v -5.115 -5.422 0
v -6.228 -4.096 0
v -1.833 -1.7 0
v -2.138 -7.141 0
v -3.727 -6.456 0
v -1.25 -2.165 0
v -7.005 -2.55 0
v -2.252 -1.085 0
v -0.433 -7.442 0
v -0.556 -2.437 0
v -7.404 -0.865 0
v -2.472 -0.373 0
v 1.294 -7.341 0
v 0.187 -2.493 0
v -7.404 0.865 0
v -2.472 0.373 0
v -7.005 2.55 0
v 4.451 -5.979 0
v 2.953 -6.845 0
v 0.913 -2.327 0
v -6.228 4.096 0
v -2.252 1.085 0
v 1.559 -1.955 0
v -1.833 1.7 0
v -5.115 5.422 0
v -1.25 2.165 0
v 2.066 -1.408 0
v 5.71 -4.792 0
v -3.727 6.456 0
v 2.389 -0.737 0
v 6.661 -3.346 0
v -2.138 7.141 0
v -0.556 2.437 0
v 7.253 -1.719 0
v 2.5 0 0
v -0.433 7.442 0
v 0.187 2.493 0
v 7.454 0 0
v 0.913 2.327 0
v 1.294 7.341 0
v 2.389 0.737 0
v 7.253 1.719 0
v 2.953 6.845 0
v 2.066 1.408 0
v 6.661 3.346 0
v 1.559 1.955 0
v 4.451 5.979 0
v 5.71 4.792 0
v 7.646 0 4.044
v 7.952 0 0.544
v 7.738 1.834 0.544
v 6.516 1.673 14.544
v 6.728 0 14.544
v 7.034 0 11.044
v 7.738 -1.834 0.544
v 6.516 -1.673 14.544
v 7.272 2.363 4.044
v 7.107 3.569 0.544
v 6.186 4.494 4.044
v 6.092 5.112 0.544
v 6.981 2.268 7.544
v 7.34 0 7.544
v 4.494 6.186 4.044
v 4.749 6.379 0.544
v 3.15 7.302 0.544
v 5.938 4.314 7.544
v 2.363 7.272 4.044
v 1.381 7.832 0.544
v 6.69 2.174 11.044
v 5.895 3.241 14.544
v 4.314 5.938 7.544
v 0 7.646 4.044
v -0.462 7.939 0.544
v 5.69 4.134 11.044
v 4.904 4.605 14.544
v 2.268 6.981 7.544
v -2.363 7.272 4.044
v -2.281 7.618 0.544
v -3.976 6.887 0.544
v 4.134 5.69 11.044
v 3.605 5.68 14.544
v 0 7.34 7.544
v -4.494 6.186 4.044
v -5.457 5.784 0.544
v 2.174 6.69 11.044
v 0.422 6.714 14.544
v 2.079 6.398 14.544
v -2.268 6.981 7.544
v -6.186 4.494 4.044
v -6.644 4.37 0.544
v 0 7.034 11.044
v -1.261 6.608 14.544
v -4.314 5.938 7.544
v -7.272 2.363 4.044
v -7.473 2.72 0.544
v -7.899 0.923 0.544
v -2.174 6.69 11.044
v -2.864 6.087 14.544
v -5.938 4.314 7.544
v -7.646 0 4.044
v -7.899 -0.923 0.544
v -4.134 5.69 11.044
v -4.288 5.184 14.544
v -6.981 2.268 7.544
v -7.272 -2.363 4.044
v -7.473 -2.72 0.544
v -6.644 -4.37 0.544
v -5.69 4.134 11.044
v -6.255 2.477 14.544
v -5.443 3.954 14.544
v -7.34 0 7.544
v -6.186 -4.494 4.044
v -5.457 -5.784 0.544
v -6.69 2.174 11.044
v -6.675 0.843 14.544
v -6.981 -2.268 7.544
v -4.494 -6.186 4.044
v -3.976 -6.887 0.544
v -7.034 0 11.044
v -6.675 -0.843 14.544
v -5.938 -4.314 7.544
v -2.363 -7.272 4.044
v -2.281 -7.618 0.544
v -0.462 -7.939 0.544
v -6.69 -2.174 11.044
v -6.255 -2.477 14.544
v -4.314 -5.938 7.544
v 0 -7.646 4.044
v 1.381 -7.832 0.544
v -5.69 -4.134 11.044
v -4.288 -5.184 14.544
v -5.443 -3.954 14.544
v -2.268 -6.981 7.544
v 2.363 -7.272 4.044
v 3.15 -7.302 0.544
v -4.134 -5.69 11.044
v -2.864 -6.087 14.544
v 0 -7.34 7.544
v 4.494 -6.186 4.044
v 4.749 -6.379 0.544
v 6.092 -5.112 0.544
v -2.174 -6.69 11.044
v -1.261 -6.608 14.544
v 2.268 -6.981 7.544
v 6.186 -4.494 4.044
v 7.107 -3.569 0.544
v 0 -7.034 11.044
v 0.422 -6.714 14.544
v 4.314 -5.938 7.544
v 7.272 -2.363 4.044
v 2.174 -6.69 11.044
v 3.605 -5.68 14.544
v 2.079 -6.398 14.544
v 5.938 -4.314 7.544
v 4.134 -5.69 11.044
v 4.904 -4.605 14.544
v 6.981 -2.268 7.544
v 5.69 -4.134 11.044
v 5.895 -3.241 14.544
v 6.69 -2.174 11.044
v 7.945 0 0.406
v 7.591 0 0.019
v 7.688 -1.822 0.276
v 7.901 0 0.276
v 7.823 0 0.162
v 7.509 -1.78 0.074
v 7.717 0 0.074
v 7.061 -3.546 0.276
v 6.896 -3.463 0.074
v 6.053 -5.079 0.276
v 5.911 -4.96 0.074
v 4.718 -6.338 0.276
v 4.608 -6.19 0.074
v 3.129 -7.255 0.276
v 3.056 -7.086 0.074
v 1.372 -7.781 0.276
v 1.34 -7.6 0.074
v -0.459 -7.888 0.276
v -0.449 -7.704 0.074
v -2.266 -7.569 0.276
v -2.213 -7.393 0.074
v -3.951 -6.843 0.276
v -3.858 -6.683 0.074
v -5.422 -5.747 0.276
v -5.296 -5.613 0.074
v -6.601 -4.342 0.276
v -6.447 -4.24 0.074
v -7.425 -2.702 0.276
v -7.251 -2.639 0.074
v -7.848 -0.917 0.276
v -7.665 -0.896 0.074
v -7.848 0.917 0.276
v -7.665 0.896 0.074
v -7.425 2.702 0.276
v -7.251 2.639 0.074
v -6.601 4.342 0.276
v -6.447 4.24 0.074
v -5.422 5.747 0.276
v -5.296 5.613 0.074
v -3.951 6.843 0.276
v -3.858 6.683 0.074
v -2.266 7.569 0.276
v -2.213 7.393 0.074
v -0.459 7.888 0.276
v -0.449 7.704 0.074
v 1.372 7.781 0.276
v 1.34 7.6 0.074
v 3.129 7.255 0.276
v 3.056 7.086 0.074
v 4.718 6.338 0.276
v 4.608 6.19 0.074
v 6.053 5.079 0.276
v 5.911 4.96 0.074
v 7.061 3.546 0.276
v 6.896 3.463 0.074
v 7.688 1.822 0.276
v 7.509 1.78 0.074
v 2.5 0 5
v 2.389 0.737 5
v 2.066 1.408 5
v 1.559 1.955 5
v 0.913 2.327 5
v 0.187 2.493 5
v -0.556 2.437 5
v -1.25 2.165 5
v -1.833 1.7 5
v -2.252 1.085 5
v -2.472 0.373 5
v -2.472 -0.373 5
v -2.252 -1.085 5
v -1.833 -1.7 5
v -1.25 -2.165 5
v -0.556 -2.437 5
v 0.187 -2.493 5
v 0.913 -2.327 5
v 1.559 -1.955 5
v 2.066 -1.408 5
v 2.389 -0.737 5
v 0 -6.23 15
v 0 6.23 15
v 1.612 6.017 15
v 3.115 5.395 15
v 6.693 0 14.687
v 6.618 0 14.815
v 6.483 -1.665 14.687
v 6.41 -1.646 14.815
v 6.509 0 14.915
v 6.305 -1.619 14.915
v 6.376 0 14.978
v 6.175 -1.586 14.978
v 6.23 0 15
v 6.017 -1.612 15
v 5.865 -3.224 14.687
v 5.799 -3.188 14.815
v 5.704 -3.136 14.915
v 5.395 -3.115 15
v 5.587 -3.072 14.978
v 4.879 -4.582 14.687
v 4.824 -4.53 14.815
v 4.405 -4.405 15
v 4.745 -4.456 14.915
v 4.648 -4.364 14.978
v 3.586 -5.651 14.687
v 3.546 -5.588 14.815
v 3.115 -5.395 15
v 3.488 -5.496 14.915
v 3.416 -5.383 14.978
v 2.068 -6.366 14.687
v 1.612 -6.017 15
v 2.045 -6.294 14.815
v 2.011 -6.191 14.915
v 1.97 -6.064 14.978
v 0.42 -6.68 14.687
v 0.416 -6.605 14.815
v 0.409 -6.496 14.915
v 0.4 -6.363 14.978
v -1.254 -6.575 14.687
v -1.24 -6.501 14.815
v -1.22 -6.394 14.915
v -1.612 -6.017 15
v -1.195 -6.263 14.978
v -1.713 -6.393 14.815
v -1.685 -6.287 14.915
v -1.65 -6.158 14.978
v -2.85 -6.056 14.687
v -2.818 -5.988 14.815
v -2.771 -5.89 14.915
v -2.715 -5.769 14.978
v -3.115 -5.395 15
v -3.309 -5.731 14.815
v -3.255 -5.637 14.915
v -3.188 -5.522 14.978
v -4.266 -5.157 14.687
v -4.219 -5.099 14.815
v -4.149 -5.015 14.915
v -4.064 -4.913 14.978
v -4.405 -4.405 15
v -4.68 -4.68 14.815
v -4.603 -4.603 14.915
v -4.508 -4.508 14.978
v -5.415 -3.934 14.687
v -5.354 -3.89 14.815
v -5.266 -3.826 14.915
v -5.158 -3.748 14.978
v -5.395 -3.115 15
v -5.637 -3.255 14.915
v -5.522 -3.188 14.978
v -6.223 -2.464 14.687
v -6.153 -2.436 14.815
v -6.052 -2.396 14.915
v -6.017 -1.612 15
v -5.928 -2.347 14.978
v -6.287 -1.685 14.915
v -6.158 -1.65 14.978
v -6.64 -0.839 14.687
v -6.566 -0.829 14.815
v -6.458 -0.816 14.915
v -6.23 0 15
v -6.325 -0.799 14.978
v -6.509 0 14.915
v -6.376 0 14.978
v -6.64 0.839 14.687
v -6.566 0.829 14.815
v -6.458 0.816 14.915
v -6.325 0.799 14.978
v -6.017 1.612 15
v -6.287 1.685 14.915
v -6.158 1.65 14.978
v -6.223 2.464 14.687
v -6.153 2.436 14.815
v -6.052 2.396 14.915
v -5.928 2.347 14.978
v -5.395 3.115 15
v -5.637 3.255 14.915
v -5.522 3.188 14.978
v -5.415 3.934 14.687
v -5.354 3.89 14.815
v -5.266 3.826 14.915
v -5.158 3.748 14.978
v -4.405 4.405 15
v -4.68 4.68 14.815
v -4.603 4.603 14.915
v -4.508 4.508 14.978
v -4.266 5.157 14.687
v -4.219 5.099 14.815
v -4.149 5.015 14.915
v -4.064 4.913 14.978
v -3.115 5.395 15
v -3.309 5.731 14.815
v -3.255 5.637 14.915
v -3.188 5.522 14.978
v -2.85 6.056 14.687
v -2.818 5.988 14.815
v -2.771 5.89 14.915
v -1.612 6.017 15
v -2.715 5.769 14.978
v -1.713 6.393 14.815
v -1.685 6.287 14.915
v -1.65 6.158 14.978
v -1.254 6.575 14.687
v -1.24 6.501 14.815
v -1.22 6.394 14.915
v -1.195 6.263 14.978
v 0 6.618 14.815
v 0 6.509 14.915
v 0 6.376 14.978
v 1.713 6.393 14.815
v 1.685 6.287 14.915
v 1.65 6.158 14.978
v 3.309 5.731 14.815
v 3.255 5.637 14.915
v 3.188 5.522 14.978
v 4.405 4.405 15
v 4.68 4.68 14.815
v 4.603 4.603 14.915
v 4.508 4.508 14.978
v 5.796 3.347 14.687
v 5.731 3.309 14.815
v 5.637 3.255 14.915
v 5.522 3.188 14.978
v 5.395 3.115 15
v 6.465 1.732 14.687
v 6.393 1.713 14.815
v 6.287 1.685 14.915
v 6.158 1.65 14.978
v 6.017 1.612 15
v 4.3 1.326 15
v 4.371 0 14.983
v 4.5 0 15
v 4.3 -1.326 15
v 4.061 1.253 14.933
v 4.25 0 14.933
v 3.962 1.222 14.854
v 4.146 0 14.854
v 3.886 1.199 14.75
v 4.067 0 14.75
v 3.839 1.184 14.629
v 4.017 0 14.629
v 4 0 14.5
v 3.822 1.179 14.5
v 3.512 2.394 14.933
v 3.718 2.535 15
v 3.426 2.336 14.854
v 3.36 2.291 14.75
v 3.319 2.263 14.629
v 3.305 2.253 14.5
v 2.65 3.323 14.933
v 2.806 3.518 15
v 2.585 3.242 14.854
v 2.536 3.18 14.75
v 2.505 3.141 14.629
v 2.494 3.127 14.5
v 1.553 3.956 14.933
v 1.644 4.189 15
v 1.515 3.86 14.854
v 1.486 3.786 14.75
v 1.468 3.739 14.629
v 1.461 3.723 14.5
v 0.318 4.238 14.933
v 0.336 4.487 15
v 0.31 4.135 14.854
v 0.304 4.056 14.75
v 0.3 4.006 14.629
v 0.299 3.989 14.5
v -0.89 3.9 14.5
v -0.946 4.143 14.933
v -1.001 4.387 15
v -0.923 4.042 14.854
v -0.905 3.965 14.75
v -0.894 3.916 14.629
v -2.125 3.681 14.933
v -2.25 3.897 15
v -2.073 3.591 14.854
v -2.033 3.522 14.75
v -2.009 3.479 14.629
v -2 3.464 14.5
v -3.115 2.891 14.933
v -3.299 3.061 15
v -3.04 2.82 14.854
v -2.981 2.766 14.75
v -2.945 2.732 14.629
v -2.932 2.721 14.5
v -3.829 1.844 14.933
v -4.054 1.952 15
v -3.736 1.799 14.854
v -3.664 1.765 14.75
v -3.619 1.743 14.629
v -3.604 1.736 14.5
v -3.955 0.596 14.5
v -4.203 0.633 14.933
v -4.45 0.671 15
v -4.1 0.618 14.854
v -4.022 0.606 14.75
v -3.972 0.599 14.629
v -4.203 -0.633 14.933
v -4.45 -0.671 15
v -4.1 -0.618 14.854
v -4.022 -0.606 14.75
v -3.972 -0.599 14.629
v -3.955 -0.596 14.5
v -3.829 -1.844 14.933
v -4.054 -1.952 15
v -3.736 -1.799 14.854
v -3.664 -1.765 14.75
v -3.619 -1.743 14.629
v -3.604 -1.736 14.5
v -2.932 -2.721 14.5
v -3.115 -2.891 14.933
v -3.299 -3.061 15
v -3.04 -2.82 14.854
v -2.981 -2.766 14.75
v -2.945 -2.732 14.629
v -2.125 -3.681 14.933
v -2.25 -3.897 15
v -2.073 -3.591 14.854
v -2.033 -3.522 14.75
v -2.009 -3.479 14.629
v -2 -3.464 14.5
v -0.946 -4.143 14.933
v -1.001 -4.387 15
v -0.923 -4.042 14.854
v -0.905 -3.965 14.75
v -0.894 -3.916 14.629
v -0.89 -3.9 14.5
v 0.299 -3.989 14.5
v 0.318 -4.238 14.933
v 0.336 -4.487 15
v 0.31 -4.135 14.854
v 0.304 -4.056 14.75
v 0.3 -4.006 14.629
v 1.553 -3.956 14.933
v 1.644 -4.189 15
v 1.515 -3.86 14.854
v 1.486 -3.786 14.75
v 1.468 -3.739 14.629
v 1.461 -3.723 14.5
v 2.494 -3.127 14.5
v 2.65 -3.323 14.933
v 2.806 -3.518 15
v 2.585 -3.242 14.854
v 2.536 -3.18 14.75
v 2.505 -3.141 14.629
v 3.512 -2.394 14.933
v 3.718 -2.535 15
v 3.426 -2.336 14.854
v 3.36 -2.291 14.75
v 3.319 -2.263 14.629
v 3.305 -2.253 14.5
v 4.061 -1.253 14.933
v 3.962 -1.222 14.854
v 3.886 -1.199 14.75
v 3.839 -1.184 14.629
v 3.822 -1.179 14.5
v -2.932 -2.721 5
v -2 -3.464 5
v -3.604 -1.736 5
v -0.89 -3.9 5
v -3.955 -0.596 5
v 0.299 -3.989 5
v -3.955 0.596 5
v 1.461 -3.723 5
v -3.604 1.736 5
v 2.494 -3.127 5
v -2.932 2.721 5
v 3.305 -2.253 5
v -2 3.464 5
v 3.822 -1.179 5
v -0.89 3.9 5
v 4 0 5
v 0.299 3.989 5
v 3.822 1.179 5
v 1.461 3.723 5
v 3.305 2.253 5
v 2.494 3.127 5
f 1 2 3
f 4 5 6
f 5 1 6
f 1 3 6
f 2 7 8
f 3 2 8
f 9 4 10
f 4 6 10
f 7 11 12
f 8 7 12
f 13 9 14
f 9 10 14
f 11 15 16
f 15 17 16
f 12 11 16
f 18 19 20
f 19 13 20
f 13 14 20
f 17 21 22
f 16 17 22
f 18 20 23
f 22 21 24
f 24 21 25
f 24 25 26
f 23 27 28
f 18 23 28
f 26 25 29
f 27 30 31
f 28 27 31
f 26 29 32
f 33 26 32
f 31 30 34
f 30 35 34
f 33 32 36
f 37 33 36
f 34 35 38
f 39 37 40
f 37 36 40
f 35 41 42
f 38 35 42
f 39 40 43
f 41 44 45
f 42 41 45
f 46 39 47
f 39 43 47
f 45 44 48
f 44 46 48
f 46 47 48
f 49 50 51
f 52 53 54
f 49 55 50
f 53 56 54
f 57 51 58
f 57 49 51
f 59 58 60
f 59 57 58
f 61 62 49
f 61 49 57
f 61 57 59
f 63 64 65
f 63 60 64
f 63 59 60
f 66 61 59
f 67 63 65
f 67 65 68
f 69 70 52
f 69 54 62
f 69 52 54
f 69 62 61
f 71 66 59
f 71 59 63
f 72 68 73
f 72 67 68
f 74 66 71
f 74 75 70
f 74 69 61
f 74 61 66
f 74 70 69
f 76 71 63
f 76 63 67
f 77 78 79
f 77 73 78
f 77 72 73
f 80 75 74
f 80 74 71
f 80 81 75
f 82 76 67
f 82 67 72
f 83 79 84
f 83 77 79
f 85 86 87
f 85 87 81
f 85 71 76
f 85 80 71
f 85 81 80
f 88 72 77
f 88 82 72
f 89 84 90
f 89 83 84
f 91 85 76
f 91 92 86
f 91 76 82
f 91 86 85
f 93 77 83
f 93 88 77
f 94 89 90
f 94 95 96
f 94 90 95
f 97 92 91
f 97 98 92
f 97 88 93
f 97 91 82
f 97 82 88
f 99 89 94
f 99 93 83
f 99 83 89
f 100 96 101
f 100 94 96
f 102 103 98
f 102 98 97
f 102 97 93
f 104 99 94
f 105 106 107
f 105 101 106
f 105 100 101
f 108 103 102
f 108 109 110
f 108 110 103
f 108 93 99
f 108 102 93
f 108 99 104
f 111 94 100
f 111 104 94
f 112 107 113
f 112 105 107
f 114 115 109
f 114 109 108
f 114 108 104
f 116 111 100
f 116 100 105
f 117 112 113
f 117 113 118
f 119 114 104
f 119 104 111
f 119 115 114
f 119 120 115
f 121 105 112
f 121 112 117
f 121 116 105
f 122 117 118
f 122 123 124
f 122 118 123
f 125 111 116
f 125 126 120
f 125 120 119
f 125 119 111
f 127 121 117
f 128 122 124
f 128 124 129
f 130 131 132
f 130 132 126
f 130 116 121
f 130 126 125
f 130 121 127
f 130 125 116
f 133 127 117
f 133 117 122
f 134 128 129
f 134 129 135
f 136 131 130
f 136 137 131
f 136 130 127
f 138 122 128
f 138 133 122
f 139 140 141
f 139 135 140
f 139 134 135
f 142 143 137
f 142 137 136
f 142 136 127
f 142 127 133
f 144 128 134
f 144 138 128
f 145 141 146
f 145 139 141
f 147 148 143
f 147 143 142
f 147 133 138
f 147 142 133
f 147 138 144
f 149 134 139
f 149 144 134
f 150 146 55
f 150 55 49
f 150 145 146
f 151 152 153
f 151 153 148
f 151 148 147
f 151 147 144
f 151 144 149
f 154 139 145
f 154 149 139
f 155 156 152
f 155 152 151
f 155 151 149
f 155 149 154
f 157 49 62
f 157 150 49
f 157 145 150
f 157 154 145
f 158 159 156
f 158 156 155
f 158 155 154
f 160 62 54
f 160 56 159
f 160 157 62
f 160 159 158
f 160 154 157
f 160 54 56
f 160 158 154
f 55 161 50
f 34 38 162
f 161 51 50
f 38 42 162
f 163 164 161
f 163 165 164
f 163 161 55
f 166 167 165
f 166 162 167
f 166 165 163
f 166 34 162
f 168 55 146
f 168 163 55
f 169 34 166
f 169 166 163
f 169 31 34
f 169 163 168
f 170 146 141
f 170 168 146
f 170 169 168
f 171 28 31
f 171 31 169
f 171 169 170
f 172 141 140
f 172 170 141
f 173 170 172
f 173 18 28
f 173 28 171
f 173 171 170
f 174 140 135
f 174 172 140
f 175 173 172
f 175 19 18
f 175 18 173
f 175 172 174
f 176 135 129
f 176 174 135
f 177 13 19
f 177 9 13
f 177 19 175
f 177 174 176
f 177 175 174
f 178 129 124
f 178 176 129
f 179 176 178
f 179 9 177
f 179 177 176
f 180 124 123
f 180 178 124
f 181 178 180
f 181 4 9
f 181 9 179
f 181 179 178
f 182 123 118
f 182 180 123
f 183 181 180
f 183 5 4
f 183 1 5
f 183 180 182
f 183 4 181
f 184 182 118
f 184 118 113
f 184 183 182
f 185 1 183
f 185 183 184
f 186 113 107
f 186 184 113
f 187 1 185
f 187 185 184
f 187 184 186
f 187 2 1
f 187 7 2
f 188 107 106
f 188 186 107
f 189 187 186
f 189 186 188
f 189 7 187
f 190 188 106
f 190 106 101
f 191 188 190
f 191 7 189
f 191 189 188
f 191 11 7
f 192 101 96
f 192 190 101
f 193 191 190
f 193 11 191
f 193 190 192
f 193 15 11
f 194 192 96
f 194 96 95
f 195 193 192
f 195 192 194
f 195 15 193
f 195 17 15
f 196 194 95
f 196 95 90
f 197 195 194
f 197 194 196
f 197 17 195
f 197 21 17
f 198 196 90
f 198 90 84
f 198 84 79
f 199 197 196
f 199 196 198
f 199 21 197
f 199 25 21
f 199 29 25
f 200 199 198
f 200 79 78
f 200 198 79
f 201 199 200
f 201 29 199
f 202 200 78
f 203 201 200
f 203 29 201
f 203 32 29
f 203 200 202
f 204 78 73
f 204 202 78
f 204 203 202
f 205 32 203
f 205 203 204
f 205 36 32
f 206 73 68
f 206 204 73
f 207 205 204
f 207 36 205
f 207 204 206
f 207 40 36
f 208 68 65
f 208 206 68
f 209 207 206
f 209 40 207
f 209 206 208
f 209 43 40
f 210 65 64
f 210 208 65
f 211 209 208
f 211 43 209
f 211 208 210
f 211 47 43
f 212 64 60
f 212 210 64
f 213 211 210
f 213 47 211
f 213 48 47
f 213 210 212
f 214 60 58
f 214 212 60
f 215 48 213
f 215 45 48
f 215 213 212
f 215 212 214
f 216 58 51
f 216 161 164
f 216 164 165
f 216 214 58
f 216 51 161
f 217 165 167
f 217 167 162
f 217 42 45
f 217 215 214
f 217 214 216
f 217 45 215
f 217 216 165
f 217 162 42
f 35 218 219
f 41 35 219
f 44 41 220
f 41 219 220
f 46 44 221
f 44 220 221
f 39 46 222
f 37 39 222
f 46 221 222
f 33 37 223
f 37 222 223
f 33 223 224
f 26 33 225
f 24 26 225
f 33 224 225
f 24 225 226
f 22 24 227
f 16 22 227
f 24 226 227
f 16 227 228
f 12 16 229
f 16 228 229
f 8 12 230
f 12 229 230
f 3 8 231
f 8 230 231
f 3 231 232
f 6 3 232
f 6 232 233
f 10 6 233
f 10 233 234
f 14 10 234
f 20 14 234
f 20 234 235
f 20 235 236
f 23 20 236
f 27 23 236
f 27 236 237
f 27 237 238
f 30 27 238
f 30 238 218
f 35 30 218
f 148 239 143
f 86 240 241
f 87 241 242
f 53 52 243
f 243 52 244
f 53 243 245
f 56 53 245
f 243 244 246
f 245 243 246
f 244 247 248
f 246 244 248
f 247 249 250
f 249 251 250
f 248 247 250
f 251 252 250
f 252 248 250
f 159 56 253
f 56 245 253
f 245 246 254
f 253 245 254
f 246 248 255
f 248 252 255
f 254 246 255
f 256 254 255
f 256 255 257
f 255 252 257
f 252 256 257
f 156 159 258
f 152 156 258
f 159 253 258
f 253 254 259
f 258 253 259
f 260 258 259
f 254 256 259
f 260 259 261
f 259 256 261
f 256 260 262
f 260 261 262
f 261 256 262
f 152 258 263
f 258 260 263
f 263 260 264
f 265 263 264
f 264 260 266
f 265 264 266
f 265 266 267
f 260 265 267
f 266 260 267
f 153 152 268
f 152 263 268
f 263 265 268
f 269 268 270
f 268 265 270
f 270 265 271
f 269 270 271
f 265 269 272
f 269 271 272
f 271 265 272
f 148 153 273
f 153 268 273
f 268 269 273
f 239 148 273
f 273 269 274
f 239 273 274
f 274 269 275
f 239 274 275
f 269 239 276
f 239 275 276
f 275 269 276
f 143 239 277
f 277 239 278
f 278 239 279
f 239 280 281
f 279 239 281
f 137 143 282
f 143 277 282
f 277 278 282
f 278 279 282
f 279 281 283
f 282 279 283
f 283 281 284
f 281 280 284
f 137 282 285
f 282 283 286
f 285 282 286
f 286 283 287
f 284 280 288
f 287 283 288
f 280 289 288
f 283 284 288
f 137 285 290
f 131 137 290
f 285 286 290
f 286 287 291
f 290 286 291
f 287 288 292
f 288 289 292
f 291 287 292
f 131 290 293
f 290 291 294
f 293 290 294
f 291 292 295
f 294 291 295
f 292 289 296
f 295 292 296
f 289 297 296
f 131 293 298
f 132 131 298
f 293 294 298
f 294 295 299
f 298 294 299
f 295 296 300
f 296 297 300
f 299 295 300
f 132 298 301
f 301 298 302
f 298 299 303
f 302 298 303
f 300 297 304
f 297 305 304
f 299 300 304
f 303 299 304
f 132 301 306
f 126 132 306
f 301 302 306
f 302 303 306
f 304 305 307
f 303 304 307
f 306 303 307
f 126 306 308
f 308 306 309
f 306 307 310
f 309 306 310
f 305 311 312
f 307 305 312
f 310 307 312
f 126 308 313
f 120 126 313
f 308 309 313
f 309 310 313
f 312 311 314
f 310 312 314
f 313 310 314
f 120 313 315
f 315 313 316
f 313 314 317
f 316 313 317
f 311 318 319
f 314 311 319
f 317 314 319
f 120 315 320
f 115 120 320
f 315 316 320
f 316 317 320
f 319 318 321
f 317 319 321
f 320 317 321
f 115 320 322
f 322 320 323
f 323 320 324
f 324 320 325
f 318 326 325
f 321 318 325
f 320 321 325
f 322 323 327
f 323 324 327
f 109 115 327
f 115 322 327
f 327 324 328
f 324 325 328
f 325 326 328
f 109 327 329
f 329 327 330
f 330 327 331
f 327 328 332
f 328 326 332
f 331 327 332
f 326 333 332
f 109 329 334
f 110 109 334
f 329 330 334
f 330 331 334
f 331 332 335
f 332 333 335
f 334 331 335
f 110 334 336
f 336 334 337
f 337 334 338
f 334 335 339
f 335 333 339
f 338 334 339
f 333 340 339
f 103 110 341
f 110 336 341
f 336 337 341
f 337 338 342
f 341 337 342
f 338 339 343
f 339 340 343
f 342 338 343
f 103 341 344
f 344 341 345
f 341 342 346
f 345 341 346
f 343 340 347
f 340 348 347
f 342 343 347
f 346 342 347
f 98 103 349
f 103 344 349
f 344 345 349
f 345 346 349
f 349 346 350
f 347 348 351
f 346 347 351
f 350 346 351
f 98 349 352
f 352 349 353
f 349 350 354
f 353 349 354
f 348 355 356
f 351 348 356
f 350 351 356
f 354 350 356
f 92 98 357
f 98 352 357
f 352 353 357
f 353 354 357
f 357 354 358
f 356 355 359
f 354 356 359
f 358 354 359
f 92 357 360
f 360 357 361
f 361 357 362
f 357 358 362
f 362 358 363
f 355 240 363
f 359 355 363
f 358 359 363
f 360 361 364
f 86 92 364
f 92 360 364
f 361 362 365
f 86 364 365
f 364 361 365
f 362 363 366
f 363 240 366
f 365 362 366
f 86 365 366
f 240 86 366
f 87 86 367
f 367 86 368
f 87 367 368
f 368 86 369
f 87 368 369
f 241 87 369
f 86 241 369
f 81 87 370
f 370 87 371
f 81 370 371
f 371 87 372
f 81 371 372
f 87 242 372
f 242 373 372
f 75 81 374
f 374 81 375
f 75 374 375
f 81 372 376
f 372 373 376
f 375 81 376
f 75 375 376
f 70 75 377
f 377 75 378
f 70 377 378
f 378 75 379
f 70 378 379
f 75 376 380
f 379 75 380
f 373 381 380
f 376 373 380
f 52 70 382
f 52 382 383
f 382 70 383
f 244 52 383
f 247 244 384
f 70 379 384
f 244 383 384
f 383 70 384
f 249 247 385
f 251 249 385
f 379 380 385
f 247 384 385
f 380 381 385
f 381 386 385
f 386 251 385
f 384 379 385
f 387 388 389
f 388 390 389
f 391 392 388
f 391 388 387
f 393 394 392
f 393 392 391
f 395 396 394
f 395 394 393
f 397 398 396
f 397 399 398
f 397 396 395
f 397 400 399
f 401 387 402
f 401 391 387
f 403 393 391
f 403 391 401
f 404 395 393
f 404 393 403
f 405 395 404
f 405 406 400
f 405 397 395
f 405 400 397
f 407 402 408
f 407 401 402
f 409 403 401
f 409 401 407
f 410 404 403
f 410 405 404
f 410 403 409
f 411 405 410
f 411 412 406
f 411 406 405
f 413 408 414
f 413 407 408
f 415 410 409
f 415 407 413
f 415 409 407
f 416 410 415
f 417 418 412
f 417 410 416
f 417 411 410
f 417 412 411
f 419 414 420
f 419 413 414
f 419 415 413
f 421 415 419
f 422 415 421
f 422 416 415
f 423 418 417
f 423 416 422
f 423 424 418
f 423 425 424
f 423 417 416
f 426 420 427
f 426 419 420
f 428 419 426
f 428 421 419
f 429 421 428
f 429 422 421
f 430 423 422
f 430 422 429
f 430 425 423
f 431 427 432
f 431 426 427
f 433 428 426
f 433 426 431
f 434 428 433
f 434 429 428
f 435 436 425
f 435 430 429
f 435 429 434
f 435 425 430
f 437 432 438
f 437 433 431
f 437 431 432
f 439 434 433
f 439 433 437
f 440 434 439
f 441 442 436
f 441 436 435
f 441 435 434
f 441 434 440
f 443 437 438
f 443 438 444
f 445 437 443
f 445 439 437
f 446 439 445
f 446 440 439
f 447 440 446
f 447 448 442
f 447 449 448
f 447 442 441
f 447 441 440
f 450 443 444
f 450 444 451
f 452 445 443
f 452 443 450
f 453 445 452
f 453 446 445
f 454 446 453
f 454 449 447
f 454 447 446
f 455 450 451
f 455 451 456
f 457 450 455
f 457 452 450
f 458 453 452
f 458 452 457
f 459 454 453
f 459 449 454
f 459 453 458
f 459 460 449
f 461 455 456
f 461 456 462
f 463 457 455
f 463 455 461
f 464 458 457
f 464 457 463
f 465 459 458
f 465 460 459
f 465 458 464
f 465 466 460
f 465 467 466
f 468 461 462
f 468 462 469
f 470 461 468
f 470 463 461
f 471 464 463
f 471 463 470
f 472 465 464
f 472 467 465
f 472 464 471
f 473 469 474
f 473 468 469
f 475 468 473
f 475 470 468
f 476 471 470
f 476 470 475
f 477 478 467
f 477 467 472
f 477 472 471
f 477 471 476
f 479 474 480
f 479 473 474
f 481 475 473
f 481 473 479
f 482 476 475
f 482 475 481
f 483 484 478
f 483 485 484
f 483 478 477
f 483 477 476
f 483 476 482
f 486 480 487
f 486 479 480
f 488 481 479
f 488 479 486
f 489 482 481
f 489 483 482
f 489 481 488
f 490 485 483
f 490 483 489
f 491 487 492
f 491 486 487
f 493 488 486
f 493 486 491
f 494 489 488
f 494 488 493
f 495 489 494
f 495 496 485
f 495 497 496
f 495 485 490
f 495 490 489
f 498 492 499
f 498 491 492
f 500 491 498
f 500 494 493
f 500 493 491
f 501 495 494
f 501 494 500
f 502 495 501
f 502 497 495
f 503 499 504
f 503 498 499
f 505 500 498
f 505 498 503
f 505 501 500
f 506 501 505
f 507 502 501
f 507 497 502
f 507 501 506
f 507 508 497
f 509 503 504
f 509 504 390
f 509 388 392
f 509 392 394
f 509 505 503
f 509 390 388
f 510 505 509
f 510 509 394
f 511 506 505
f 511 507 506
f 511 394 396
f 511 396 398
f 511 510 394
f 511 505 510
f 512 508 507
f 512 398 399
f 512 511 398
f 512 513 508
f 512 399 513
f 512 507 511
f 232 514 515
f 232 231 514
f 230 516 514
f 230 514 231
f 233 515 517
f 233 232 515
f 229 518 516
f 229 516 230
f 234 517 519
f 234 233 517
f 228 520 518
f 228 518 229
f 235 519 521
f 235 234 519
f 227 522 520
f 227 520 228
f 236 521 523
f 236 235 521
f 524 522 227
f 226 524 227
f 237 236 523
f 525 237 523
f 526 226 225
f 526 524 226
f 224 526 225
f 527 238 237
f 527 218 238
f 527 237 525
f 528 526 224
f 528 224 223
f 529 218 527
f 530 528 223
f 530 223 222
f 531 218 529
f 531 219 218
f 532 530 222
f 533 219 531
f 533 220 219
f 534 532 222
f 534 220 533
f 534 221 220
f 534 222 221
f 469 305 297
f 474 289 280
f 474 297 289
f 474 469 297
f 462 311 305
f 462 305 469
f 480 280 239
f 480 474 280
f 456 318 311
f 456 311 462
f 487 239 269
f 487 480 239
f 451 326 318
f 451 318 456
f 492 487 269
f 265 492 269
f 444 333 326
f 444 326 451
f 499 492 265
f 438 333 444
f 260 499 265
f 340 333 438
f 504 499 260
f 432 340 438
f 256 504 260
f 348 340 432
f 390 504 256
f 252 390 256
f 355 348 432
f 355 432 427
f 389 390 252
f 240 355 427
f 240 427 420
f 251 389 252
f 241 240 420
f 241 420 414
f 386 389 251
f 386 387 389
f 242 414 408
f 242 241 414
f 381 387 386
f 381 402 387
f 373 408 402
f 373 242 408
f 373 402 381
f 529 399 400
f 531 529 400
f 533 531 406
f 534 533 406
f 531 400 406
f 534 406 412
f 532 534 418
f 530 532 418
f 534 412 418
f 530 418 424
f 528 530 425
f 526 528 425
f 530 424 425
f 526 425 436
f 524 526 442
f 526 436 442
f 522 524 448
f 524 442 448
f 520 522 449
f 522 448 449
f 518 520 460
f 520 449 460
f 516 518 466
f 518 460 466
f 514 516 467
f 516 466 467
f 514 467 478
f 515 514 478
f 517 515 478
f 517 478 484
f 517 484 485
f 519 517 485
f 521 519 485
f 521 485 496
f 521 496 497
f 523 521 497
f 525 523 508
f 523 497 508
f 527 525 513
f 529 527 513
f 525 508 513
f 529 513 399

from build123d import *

# Parameters (mm, degrees)
ESQUISSE1_R             = 8
BOSS_EXTRU_1_DEPTH      = 15
BOSS_EXTRU_1_TAPER      = 5
ESQUISSE2_R             = 2.5
ENL_V_MAT_EXTRU_1_DEPTH = 30
ESQUISSE3_R             = 4
ENL_V_MAT_EXTRU_2_DEPTH = 10
CONG_2_R                = 0.5
CONG_3_R                = 0.5
CONG_4_R                = 0.5


with BuildPart() as part:
    # Esquisse1 → Boss.-Extru.1 (new body)
    with BuildSketch(Plane.XY):
        Circle(ESQUISSE1_R)
    extrude(amount=BOSS_EXTRU_1_DEPTH, taper=BOSS_EXTRU_1_TAPER)

    # Esquisse2 → Enlèv. mat.-Extru.1 (cut)
    with BuildSketch(Plane.XY.offset(15)):
        Circle(ESQUISSE2_R)
    extrude(amount=-ENL_V_MAT_EXTRU_1_DEPTH, mode=Mode.SUBTRACT)

    # Esquisse3 → Enlèv. mat.-Extru.2 (cut)
    with BuildSketch(Plane.XY.offset(15)):
        Circle(ESQUISSE3_R)
    extrude(amount=-ENL_V_MAT_EXTRU_2_DEPTH, mode=Mode.SUBTRACT)

    # Congé2
    cong_2_edges = [part.edges().sort_by_distance(p)[0] for p in [
        (-4, 0, 15),
    ]]
    fillet(cong_2_edges, radius=CONG_2_R)

    # Congé3
    cong_3_edges = [part.edges().sort_by_distance(p)[0] for p in [
        (-8, 0, 0),
    ]]
    fillet(cong_3_edges, radius=CONG_3_R)

    # Congé4
    cong_4_edges = [part.edges().sort_by_distance(p)[0] for p in [
        (-6.687670047, 0, 15),
    ]]
    fillet(cong_4_edges, radius=CONG_4_R)


solid = part.part
